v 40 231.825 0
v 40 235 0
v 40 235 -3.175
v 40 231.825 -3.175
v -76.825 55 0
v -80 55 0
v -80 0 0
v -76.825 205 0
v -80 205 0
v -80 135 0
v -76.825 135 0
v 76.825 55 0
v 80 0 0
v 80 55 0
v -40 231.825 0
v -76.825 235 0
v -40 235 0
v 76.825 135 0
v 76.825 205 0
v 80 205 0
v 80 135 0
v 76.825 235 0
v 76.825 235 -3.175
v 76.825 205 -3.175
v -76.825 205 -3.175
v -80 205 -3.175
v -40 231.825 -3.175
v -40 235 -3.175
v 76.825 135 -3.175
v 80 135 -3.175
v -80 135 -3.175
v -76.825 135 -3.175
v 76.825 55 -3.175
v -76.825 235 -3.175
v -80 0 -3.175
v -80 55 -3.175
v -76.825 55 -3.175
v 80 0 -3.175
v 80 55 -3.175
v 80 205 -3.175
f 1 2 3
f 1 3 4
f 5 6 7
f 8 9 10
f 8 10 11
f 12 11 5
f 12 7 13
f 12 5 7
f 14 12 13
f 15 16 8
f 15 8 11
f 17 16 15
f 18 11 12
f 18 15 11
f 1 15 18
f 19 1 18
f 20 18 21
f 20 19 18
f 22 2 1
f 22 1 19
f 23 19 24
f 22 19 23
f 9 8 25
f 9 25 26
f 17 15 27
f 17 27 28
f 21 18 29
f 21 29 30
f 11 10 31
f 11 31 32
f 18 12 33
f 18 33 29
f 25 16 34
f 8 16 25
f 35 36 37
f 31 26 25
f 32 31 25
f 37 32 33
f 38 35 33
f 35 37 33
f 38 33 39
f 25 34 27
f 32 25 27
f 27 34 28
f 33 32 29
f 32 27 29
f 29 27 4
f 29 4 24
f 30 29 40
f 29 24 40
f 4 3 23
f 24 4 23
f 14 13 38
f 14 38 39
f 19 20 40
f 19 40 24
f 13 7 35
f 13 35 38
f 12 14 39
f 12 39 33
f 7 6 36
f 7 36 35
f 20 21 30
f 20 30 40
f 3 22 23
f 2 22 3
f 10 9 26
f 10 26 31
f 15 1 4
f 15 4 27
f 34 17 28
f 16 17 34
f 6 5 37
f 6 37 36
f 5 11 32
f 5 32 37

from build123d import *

# Parameters (mm, degrees)
BOSS_EXTRUDE1_DEPTH = 3.175


with BuildPart() as part:
    # Sketch1 → Boss-Extrude1 (new body)
    with BuildSketch(Plane.XY):
        Polygon((0, 0), (80, 0), (80, 55), (76.825, 55), (76.825, 135), (80, 135), (80, 205), (76.825, 205), (76.825, 235), (40, 235), (40, 231.825), (0, 231.825), (-40, 231.825), (-40, 235), (-76.825, 235), (-76.825, 205), (-80, 205), (-80, 135), (-76.825, 135), (-76.825, 55), (-80, 55), (-80, 0), align=None)
    extrude(amount=-BOSS_EXTRUDE1_DEPTH)


solid = part.part
